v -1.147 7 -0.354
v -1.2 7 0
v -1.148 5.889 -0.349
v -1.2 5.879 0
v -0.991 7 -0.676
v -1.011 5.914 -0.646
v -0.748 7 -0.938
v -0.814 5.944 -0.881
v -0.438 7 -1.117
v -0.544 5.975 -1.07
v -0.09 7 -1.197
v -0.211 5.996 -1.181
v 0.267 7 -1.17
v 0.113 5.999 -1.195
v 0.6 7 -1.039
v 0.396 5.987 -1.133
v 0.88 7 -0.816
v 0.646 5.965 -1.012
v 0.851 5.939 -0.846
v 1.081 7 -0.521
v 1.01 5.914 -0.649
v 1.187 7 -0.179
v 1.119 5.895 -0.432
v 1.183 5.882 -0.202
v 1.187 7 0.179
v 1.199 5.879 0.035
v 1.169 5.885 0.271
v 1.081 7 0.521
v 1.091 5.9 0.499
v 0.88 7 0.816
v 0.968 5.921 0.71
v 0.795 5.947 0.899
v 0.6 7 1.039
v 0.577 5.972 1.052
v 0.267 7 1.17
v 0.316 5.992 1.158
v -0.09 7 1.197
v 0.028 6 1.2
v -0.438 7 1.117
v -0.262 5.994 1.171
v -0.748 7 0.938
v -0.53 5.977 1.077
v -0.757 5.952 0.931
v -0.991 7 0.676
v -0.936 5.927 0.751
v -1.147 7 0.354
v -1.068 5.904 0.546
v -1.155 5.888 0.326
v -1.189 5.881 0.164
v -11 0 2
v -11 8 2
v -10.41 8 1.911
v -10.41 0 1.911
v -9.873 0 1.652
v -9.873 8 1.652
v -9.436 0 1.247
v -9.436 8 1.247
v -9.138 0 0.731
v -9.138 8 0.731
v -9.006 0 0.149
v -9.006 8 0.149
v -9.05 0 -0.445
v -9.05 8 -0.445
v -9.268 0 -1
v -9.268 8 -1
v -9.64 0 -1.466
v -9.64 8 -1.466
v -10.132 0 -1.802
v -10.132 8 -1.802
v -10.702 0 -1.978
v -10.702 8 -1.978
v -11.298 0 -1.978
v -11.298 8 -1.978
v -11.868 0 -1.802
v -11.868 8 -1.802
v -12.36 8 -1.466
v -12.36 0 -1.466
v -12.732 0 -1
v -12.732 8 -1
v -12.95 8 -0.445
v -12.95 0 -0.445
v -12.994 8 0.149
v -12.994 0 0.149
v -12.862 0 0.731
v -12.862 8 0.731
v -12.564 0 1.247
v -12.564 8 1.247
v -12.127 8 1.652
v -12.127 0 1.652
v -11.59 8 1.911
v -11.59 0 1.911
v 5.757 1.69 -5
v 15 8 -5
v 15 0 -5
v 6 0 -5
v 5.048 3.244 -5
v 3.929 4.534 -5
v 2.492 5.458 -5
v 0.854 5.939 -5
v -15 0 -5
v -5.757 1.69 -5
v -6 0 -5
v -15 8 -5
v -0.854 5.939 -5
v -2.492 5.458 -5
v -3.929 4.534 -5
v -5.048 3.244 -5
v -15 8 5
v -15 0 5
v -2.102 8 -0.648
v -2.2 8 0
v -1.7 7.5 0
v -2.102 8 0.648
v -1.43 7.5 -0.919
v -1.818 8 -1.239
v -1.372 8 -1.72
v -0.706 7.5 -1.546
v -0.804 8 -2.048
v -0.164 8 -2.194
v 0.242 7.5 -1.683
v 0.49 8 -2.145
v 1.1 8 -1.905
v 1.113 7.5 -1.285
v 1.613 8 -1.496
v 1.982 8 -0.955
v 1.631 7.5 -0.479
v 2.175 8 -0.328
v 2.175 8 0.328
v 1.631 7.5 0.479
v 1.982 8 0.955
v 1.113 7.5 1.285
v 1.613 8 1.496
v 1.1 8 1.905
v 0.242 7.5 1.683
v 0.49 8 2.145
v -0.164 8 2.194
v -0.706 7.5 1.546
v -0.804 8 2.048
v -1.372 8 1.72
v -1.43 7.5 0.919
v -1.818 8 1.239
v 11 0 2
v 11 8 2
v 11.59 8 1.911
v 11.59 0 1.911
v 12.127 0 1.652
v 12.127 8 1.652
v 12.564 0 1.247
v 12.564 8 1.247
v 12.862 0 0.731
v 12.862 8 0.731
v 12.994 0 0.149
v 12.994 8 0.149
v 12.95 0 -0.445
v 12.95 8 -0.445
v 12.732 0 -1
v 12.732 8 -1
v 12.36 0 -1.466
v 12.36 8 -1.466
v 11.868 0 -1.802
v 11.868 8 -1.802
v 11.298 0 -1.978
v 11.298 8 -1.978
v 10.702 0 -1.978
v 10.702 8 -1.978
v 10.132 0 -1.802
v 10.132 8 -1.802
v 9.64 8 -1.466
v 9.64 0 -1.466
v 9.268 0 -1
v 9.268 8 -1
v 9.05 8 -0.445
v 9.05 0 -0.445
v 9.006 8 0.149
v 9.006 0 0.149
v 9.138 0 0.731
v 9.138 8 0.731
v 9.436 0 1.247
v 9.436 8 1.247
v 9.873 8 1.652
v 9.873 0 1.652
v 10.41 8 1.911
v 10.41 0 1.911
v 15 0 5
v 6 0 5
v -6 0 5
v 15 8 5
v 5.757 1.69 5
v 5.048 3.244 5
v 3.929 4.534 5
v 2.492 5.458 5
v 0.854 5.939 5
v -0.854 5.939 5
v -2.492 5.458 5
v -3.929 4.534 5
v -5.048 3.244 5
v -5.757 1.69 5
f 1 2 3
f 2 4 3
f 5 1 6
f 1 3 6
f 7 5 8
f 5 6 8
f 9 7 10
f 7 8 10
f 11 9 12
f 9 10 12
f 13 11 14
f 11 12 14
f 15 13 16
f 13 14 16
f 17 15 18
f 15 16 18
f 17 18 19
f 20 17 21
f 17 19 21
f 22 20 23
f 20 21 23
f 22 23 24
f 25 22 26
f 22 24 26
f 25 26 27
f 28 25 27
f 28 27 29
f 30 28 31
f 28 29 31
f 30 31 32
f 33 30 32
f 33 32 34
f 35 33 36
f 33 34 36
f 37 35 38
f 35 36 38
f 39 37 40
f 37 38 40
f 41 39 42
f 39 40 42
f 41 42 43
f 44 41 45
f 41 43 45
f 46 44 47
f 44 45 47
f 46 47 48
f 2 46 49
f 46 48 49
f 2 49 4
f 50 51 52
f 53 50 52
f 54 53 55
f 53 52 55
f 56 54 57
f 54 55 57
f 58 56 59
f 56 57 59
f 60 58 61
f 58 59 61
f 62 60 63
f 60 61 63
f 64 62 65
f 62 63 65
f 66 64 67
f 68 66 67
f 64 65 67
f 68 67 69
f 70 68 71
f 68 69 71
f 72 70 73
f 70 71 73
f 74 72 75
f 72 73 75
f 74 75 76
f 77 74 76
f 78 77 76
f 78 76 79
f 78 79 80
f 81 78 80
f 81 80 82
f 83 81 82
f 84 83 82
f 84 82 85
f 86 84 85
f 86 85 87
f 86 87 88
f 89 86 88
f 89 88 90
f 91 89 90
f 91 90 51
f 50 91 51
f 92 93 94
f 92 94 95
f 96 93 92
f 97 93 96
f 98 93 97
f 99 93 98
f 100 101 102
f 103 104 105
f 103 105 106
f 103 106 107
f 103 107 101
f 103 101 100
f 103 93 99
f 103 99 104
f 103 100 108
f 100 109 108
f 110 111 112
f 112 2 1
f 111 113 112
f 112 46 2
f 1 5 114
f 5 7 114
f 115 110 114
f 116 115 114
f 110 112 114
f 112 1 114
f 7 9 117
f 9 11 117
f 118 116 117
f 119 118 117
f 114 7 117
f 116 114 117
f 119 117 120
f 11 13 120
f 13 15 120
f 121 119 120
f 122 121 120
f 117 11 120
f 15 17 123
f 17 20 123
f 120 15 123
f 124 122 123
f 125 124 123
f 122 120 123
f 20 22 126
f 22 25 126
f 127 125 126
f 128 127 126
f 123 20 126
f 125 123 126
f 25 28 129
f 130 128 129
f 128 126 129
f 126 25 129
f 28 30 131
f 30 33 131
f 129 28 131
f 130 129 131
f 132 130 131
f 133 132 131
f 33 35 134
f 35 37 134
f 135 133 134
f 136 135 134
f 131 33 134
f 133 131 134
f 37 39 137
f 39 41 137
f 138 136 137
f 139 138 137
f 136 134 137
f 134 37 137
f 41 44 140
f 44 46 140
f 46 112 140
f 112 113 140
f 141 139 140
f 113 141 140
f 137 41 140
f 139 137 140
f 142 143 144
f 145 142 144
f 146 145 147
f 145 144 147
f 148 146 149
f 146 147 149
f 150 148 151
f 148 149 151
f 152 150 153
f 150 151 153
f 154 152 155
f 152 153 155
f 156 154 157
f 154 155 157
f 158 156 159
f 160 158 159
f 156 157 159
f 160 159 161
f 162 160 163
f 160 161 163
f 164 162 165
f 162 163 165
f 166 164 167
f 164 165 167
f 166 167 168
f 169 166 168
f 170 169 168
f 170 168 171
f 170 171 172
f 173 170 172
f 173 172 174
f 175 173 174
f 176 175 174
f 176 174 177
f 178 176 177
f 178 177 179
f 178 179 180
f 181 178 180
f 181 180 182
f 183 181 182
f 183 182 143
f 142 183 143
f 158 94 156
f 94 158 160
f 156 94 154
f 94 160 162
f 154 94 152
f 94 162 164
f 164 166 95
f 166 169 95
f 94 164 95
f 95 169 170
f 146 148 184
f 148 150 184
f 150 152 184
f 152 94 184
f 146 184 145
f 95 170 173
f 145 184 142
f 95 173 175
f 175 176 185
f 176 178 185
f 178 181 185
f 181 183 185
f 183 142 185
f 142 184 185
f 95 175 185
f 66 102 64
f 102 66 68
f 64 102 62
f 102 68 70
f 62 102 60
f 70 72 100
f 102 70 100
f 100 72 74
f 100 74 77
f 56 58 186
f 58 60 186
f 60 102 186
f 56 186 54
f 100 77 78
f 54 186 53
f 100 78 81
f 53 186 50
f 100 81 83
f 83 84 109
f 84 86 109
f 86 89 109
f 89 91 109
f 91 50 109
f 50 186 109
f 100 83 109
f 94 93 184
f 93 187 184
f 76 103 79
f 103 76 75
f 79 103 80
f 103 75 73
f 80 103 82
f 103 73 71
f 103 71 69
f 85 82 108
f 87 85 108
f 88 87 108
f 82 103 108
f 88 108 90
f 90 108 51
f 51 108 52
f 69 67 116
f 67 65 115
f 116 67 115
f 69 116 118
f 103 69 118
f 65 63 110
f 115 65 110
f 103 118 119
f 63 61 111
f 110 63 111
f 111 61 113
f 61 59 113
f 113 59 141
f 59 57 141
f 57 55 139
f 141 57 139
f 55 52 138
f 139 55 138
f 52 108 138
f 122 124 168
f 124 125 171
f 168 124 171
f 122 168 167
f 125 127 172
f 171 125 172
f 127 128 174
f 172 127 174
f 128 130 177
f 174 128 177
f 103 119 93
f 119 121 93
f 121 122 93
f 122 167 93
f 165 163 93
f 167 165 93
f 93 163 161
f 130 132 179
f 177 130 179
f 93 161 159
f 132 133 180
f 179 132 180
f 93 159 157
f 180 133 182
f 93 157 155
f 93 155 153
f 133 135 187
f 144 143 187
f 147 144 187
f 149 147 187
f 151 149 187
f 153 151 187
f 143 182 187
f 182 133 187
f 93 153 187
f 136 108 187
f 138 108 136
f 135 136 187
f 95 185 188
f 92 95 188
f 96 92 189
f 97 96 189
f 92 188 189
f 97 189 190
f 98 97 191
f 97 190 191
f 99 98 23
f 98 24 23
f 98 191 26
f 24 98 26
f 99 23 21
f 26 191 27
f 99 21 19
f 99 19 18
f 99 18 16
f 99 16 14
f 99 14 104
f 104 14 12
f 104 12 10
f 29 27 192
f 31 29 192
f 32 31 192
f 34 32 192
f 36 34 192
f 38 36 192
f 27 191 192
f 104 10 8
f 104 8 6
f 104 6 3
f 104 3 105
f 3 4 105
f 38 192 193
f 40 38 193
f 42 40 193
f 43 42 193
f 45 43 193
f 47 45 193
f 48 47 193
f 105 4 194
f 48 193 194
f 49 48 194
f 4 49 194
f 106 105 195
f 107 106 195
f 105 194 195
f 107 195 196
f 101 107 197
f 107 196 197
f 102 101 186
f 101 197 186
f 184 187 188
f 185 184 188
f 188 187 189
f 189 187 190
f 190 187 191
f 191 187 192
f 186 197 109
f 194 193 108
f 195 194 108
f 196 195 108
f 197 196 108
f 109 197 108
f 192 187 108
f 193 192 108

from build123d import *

# Parameters (mm, degrees)
BOSS_EXTRUDE1_DEPTH                             = 5
SKETCH2_R                                       = 2
CUT_EXTRUDE1_DEPTH                              = 18.720045147
CSK_FOR_M2_FLAT_HEAD_MACHINE_SCREW1_D           = 2.4
CSK_FOR_M2_FLAT_HEAD_MACHINE_SCREW1_CSINK_D     = 4.4
CSK_FOR_M2_FLAT_HEAD_MACHINE_SCREW1_CSINK_ANGLE = 90


with BuildPart() as part:
    # Sketch1 → Boss-Extrude1 (new, symmetric)
    with BuildSketch(Plane.XY):
        with BuildLine():
            Line((-6, 0), (-15, 0))
            Line((-15, 0), (-15, 8))
            Line((-15, 8), (15, 8))
            Line((15, 8), (15, 0))
            Line((15, 0), (6, 0))
            ThreePointArc((6, 0), (0, 6), (-6, 0))
        make_face()
    extrude(amount=BOSS_EXTRUDE1_DEPTH, both=True)

    # Sketch2 → Cut-Extrude1 (cut, through all)
    with BuildSketch(Plane(origin=(0, 8, 0), x_dir=(1, 0, 0), z_dir=(0, 1, 0))):
        with Locations(Location((-11, 0, 0), (0, 0, 270))):
            Circle(SKETCH2_R)
        with Locations(Location((11, 0, 0), (0, 0, 270))):
            Circle(SKETCH2_R)
    extrude(amount=-CUT_EXTRUDE1_DEPTH, mode=Mode.SUBTRACT)

    # CSK for M2 Flat Head Machine Screw1 (through all)
    with Locations(Plane(origin=(0, 8, 0), x_dir=(1, 0, 0), z_dir=(0, 1, 0))):
        with Locations((0, 0)):
            CounterSinkHole(CSK_FOR_M2_FLAT_HEAD_MACHINE_SCREW1_D / 2, CSK_FOR_M2_FLAT_HEAD_MACHINE_SCREW1_CSINK_D / 2, counter_sink_angle=CSK_FOR_M2_FLAT_HEAD_MACHINE_SCREW1_CSINK_ANGLE)


solid = part.part
